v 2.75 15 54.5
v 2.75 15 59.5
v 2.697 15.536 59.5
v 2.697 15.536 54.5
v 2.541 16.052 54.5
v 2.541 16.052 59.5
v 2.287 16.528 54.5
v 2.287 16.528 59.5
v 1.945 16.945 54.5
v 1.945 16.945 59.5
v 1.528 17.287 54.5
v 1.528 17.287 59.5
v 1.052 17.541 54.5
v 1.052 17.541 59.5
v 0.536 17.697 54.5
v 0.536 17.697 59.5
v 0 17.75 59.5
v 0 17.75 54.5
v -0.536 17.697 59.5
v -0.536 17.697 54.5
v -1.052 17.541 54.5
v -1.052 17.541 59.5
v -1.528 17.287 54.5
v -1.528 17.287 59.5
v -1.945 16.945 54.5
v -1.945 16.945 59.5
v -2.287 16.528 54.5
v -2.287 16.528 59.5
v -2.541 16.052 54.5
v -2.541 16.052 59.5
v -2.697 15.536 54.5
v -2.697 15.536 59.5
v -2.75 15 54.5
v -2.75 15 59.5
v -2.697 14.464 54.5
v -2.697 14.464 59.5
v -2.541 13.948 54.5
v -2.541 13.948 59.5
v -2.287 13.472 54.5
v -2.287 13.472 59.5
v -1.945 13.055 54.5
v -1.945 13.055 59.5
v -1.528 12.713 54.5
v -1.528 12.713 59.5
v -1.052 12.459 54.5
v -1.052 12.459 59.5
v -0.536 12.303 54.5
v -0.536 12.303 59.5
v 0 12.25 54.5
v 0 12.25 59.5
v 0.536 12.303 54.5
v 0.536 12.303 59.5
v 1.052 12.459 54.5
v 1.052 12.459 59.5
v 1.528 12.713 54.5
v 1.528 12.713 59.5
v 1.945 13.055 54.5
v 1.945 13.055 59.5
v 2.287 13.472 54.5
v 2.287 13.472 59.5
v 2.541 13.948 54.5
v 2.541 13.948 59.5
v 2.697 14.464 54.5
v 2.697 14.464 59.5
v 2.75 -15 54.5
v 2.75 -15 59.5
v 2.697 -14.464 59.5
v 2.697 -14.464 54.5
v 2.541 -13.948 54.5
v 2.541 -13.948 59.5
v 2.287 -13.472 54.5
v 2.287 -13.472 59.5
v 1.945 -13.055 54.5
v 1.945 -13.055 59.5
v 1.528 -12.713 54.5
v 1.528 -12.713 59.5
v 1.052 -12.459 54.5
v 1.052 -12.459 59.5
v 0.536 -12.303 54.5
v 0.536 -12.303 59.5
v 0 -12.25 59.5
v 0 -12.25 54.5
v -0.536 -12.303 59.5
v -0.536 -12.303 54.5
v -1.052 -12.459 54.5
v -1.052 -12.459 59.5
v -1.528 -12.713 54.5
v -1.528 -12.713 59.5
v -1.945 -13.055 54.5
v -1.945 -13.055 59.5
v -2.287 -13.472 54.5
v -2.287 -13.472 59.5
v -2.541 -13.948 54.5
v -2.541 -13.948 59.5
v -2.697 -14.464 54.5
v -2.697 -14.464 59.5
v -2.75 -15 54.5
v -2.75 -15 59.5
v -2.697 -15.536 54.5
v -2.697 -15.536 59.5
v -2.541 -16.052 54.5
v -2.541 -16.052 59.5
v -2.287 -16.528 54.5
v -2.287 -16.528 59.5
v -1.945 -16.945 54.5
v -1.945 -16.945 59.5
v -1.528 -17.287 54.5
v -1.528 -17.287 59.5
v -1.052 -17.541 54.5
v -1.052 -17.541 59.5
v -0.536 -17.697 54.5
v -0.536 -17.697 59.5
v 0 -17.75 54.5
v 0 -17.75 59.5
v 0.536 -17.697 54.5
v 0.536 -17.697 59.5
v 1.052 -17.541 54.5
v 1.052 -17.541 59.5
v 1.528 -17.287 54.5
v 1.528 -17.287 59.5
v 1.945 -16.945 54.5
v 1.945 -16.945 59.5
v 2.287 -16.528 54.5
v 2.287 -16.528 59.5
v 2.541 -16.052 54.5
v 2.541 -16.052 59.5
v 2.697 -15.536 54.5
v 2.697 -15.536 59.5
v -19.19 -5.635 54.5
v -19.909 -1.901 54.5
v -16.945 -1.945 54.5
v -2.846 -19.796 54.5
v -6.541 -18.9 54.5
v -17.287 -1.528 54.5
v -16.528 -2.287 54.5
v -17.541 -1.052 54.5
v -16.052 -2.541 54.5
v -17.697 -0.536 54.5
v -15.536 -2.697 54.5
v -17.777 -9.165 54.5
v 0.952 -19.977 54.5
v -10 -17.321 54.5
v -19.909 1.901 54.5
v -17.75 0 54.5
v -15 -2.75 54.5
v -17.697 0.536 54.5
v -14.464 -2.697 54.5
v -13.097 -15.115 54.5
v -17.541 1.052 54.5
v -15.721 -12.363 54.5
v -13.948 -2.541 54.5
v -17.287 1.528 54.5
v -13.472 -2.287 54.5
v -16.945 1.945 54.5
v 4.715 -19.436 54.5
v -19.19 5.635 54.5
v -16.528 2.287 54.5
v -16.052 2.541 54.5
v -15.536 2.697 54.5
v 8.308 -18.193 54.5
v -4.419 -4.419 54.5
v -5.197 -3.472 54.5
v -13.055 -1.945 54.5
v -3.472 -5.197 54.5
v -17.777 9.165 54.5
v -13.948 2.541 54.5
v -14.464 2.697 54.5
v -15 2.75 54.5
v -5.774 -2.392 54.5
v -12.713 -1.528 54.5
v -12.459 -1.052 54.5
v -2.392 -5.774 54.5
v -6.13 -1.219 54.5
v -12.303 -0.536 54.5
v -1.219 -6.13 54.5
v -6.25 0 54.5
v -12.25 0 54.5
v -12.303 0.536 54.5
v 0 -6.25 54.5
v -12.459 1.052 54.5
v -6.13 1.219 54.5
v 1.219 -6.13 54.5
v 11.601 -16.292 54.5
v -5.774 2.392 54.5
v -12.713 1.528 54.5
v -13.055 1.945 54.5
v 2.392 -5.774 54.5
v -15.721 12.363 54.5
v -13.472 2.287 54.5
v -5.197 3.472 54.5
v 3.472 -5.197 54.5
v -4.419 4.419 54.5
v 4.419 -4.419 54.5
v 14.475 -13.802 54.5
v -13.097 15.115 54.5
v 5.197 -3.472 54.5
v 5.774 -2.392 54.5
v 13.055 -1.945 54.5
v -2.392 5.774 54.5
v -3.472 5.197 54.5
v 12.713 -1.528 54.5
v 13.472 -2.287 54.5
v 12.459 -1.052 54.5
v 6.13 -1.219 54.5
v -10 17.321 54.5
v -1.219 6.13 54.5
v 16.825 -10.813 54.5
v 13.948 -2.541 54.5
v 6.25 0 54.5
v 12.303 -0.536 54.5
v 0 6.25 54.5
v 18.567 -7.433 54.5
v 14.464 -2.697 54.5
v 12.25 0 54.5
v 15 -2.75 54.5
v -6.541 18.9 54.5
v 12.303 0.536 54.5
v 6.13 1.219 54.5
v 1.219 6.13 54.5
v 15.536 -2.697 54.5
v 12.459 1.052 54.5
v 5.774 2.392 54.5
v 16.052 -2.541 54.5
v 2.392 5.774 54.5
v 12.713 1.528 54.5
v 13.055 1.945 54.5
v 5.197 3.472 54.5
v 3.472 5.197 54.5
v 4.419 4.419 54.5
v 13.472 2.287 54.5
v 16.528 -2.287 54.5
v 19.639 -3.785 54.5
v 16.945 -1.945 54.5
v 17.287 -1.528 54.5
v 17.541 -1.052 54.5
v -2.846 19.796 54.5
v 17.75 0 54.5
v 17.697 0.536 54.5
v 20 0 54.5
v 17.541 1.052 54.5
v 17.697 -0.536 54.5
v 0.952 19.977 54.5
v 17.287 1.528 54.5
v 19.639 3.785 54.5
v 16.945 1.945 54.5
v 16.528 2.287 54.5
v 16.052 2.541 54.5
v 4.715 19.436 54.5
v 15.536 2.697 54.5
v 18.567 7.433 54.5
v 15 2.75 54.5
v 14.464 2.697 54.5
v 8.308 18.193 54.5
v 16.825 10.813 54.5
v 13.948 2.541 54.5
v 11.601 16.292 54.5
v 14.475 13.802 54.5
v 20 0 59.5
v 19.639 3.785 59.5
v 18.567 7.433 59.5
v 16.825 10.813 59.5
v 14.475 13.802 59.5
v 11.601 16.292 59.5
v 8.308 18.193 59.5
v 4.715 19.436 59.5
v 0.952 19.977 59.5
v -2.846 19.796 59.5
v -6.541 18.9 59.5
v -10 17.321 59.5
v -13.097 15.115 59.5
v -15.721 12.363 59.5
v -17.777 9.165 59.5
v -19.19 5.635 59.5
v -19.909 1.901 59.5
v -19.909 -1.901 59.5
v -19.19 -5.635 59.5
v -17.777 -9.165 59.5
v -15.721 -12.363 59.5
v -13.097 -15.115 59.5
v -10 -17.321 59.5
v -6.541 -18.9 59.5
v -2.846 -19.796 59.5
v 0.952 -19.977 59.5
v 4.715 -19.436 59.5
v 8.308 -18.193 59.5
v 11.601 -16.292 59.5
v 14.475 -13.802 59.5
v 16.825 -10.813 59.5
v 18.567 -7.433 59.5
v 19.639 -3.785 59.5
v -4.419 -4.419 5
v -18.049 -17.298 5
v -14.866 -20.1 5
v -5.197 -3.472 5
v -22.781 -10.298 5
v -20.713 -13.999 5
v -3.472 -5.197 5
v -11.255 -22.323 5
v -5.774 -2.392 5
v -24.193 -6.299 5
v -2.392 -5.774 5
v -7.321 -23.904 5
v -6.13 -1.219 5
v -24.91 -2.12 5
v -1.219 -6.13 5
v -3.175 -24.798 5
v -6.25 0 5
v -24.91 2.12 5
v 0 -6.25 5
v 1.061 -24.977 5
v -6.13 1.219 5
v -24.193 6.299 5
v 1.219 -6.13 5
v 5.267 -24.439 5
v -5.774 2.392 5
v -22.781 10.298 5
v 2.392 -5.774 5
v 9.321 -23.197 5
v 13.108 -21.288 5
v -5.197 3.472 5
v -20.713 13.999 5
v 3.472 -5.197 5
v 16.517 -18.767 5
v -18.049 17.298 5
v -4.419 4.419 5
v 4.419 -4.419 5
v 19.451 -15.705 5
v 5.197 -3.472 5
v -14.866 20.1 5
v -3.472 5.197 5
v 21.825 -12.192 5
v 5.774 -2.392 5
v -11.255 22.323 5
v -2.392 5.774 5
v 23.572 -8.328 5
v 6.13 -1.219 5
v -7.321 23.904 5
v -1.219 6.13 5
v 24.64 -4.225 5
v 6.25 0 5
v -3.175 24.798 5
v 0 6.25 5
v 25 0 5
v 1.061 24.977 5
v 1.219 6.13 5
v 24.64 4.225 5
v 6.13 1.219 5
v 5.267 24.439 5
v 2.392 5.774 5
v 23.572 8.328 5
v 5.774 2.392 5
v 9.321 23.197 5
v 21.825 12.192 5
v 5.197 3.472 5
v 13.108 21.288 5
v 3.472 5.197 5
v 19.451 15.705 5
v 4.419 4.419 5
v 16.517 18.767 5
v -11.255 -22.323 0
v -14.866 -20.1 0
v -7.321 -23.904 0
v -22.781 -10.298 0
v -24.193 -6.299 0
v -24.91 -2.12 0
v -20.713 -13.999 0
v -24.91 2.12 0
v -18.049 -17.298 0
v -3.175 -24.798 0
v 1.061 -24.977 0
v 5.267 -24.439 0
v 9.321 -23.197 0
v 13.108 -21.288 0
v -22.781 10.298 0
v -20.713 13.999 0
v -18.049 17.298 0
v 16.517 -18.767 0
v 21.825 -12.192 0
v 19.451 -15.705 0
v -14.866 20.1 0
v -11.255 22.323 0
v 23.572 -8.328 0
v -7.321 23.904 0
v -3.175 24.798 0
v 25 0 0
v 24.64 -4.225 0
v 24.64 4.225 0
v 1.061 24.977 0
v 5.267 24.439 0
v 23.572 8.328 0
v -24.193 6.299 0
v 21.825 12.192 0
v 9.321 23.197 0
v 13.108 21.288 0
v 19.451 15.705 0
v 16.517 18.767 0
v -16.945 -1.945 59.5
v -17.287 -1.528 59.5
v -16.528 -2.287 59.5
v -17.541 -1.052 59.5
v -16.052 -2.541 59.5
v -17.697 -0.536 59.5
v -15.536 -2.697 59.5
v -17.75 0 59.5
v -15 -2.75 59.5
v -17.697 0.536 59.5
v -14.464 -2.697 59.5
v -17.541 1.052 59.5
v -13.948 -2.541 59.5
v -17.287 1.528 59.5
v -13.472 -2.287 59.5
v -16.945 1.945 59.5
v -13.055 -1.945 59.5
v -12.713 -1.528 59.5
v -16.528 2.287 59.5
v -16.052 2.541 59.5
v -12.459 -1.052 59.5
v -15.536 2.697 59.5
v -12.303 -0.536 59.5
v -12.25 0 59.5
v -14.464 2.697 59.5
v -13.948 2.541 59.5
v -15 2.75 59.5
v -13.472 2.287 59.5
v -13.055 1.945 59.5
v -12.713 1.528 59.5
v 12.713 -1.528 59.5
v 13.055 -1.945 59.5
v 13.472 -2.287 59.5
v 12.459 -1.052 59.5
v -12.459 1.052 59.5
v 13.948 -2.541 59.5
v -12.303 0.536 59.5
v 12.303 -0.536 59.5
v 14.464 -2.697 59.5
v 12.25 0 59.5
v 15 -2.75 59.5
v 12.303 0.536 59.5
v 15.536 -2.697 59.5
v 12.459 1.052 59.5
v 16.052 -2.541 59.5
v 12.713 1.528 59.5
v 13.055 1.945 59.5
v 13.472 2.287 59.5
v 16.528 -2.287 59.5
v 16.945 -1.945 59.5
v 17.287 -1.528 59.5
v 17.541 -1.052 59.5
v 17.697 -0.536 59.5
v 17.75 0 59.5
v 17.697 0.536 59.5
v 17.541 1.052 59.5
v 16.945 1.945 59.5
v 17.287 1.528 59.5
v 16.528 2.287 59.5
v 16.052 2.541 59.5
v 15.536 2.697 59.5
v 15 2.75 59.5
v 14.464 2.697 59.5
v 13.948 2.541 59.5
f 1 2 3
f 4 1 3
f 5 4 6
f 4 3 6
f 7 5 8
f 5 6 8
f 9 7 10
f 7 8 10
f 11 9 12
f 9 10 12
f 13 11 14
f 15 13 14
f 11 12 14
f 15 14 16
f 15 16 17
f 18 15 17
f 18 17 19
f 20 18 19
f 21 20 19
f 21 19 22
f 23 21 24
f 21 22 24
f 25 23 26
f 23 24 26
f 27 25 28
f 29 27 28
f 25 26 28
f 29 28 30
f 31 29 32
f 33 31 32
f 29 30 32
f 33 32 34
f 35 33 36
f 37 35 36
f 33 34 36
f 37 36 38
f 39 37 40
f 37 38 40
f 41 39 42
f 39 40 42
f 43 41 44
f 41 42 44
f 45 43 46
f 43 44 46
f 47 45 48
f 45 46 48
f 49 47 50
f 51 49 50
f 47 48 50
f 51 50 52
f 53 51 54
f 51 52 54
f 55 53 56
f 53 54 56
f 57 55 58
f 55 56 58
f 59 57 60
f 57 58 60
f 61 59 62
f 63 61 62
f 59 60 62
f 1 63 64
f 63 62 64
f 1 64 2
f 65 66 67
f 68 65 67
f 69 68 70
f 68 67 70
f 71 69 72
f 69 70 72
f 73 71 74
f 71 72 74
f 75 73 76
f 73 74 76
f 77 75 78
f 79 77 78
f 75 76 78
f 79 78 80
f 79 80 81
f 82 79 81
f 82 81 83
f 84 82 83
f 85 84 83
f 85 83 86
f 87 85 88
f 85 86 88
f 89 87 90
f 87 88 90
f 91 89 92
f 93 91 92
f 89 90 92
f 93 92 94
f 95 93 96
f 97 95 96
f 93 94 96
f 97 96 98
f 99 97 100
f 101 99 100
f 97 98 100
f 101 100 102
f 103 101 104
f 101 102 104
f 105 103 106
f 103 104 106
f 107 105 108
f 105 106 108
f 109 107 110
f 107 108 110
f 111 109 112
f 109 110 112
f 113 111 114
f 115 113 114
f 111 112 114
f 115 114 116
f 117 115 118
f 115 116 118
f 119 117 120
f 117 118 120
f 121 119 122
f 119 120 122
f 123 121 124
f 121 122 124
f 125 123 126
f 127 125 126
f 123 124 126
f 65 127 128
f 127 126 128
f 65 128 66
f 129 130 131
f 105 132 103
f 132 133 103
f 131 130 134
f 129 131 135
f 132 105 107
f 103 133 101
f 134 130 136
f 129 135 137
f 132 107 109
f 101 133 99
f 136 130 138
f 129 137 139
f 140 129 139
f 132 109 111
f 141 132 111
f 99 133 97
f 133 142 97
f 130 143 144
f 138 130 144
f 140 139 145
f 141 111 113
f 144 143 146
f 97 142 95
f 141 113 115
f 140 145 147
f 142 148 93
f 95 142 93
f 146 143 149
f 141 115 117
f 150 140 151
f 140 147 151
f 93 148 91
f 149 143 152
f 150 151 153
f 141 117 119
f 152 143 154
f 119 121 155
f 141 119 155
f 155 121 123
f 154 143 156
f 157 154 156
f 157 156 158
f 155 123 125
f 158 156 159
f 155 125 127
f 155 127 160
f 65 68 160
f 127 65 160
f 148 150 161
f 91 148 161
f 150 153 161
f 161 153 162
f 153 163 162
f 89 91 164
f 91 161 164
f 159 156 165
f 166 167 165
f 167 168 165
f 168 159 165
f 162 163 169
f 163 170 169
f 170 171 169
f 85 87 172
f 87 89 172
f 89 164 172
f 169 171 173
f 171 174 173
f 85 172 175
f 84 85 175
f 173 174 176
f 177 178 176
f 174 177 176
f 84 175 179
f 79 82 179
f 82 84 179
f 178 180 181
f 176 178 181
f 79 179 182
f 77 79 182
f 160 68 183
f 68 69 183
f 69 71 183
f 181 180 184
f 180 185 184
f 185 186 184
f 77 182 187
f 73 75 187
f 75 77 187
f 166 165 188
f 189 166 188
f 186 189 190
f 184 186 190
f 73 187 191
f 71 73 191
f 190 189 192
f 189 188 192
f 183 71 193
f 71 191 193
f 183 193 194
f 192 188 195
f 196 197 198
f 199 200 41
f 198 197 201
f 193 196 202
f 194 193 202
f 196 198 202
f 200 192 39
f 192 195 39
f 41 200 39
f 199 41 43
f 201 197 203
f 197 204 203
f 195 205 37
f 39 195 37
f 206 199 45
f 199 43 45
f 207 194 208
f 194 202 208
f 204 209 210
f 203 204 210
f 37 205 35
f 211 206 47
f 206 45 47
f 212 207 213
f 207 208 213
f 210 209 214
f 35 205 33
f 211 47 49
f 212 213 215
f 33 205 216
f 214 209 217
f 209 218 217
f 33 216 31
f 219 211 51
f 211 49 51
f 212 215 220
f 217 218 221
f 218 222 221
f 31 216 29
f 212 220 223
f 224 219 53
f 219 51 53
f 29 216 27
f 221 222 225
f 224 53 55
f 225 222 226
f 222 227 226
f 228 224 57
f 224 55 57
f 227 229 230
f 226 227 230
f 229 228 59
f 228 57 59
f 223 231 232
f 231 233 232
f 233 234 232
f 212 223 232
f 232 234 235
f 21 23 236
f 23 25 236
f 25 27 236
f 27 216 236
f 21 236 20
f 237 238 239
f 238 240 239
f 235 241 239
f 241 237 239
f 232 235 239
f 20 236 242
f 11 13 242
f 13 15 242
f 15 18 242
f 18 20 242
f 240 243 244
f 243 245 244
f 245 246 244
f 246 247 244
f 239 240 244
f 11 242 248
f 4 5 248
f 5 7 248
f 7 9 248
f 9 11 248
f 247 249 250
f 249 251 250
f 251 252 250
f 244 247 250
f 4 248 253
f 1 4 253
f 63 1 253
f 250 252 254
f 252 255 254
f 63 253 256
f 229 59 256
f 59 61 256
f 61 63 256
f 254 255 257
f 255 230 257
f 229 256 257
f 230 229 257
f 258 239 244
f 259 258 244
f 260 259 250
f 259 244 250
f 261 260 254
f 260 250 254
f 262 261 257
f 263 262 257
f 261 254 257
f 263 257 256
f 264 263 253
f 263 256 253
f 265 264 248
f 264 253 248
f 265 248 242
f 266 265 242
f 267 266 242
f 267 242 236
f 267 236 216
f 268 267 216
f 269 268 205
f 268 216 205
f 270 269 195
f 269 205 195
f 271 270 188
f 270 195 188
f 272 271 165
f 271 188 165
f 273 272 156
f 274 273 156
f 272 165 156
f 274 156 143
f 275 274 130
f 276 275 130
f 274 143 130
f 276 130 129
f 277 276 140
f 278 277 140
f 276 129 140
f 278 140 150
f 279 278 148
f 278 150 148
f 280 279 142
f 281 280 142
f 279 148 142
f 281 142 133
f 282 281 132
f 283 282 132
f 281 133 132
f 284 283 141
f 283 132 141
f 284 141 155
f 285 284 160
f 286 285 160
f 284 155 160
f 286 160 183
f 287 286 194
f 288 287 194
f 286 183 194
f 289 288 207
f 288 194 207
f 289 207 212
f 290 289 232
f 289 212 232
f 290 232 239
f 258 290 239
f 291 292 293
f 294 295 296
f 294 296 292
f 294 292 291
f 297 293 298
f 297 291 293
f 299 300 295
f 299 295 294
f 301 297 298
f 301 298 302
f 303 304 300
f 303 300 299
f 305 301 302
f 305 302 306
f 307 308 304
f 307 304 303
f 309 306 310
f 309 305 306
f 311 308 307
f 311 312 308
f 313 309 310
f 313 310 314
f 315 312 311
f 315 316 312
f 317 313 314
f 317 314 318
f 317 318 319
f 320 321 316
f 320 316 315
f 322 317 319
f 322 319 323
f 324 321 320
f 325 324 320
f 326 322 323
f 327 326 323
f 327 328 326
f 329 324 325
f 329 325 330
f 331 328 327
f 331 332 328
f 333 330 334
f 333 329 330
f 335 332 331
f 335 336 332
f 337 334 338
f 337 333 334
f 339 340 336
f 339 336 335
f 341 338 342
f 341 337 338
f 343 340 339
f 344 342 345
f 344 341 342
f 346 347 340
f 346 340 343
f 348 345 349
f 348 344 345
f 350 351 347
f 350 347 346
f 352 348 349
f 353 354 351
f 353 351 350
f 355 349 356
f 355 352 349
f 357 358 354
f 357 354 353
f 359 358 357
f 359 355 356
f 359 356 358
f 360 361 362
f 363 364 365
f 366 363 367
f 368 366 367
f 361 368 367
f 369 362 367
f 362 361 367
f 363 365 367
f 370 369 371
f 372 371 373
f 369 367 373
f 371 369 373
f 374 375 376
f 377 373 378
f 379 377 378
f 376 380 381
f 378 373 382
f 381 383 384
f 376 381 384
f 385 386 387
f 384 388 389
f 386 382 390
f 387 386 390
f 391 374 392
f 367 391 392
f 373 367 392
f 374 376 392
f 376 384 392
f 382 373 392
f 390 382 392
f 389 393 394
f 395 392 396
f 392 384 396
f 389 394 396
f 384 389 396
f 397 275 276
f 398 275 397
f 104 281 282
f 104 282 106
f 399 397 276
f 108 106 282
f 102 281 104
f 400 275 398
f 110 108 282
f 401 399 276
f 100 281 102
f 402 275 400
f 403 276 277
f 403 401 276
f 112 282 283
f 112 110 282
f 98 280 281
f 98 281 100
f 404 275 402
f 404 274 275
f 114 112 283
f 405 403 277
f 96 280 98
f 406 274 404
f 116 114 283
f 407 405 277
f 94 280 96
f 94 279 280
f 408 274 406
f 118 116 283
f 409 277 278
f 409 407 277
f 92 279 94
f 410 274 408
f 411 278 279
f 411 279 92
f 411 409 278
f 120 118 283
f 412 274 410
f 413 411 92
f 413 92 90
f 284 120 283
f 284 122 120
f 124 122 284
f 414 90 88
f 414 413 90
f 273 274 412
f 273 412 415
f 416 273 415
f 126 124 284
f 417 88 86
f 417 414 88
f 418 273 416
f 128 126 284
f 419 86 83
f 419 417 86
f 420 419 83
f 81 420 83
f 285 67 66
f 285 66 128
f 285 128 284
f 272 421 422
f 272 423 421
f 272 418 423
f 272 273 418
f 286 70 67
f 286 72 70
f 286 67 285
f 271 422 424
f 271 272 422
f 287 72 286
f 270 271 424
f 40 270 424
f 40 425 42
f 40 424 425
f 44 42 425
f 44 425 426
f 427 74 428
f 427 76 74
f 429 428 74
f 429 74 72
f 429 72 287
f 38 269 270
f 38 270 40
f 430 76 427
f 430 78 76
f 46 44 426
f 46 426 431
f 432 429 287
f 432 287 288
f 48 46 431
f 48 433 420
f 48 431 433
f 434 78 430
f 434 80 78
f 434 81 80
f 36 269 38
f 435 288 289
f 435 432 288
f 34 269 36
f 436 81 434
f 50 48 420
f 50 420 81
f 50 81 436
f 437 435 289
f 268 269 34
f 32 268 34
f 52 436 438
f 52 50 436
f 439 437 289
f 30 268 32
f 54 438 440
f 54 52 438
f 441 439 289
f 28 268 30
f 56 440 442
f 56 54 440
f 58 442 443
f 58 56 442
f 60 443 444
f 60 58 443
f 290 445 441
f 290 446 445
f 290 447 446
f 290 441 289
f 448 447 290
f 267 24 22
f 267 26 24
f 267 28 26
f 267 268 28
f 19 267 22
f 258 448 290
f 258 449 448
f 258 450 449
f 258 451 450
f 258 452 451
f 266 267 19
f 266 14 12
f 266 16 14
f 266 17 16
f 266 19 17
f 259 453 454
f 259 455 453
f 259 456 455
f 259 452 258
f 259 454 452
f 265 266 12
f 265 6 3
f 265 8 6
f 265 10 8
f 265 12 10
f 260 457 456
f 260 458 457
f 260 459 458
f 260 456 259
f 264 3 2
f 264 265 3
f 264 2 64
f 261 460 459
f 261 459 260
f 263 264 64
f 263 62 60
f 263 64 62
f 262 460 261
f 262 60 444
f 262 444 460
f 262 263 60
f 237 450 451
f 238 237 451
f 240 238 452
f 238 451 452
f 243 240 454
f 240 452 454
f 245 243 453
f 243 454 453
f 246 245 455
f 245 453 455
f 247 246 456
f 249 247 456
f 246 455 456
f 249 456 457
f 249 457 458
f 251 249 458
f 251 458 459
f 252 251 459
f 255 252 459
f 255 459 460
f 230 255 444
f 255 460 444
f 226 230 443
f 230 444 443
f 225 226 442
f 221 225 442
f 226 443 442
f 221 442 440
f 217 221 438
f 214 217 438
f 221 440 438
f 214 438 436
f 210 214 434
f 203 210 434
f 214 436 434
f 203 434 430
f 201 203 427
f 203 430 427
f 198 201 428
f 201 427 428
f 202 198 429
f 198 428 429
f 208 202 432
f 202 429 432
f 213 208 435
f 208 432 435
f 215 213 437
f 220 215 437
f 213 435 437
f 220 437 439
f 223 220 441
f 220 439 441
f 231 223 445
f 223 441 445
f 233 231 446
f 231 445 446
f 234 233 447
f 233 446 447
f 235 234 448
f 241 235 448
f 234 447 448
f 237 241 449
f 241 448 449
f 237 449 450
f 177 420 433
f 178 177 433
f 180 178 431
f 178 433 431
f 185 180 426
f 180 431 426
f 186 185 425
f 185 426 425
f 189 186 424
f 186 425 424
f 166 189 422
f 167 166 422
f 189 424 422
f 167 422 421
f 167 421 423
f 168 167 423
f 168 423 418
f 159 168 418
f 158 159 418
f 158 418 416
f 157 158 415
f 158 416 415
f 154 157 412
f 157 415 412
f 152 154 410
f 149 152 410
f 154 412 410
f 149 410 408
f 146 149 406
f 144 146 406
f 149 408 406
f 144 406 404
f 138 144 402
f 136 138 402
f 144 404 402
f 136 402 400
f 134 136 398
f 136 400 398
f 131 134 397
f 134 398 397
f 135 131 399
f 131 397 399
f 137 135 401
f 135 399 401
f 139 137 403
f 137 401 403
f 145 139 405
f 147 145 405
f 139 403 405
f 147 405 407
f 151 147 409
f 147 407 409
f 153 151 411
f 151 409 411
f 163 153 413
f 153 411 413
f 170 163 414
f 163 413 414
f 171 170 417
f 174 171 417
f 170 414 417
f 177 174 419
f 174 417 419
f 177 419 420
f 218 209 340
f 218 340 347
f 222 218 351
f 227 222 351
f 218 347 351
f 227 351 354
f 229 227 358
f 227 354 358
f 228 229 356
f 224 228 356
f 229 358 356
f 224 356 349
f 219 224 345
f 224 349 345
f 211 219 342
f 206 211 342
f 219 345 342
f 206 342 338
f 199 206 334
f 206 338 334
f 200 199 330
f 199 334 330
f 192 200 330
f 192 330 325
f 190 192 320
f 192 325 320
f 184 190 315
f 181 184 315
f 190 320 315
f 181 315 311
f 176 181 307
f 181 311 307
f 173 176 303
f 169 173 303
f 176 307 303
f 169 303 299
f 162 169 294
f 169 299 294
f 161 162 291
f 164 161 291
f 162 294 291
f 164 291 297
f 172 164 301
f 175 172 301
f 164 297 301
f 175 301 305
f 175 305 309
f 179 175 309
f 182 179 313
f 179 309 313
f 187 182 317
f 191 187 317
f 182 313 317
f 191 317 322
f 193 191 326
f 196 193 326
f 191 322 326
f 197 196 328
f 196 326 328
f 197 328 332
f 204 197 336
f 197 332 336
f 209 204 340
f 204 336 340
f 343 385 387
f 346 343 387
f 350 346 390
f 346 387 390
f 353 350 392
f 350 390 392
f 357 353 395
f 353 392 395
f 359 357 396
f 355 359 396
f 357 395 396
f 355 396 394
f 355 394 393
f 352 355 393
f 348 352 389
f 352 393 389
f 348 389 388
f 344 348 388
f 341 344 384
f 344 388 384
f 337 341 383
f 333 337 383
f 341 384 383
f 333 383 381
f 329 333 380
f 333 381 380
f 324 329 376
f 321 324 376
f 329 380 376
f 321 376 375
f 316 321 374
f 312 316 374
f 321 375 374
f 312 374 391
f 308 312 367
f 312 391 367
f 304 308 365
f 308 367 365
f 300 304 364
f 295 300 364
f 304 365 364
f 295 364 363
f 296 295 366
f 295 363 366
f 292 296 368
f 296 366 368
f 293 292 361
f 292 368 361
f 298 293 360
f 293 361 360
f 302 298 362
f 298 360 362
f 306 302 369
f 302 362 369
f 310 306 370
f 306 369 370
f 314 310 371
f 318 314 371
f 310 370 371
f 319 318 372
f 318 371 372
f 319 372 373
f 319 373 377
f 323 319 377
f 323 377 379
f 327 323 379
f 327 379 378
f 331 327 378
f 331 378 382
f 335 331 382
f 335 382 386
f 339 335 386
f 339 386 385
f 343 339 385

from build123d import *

# Parameters (mm, degrees)
F0_R     = 25
F1_DEPTH = 5
F2_R     = 6.25
F3_DEPTH = 49.5
F4_R     = 20
F5_DEPTH = 5
F6_R     = 2.75
F7_DEPTH = 5


with BuildPart() as f1:
    # F0 (on Top) → F1 (new body)
    with BuildSketch(Plane.XY):
        Circle(F0_R)
    extrude(amount=F1_DEPTH)

    # F2 (on face) → F3 (join)
    with BuildSketch(Plane.XY.offset(5)):
        Circle(F2_R)
    extrude(amount=F3_DEPTH)

    # F4 (on face) → F5 (join)
    with BuildSketch(Plane.XY.offset(54.5)):
        Circle(F4_R)
    extrude(amount=F5_DEPTH)

    # F6 (on face) → F7 (cut)
    with BuildSketch(Plane.XY.offset(59.5)):
        with Locations((0, 15)):
            Circle(F6_R)
        with Locations((15, 0)):
            Circle(F6_R)
        with Locations((0, -15)):
            Circle(F6_R)
        with Locations((-15, 0)):
            Circle(F6_R)
    extrude(amount=-F7_DEPTH, mode=Mode.SUBTRACT)


solid = f1.part
